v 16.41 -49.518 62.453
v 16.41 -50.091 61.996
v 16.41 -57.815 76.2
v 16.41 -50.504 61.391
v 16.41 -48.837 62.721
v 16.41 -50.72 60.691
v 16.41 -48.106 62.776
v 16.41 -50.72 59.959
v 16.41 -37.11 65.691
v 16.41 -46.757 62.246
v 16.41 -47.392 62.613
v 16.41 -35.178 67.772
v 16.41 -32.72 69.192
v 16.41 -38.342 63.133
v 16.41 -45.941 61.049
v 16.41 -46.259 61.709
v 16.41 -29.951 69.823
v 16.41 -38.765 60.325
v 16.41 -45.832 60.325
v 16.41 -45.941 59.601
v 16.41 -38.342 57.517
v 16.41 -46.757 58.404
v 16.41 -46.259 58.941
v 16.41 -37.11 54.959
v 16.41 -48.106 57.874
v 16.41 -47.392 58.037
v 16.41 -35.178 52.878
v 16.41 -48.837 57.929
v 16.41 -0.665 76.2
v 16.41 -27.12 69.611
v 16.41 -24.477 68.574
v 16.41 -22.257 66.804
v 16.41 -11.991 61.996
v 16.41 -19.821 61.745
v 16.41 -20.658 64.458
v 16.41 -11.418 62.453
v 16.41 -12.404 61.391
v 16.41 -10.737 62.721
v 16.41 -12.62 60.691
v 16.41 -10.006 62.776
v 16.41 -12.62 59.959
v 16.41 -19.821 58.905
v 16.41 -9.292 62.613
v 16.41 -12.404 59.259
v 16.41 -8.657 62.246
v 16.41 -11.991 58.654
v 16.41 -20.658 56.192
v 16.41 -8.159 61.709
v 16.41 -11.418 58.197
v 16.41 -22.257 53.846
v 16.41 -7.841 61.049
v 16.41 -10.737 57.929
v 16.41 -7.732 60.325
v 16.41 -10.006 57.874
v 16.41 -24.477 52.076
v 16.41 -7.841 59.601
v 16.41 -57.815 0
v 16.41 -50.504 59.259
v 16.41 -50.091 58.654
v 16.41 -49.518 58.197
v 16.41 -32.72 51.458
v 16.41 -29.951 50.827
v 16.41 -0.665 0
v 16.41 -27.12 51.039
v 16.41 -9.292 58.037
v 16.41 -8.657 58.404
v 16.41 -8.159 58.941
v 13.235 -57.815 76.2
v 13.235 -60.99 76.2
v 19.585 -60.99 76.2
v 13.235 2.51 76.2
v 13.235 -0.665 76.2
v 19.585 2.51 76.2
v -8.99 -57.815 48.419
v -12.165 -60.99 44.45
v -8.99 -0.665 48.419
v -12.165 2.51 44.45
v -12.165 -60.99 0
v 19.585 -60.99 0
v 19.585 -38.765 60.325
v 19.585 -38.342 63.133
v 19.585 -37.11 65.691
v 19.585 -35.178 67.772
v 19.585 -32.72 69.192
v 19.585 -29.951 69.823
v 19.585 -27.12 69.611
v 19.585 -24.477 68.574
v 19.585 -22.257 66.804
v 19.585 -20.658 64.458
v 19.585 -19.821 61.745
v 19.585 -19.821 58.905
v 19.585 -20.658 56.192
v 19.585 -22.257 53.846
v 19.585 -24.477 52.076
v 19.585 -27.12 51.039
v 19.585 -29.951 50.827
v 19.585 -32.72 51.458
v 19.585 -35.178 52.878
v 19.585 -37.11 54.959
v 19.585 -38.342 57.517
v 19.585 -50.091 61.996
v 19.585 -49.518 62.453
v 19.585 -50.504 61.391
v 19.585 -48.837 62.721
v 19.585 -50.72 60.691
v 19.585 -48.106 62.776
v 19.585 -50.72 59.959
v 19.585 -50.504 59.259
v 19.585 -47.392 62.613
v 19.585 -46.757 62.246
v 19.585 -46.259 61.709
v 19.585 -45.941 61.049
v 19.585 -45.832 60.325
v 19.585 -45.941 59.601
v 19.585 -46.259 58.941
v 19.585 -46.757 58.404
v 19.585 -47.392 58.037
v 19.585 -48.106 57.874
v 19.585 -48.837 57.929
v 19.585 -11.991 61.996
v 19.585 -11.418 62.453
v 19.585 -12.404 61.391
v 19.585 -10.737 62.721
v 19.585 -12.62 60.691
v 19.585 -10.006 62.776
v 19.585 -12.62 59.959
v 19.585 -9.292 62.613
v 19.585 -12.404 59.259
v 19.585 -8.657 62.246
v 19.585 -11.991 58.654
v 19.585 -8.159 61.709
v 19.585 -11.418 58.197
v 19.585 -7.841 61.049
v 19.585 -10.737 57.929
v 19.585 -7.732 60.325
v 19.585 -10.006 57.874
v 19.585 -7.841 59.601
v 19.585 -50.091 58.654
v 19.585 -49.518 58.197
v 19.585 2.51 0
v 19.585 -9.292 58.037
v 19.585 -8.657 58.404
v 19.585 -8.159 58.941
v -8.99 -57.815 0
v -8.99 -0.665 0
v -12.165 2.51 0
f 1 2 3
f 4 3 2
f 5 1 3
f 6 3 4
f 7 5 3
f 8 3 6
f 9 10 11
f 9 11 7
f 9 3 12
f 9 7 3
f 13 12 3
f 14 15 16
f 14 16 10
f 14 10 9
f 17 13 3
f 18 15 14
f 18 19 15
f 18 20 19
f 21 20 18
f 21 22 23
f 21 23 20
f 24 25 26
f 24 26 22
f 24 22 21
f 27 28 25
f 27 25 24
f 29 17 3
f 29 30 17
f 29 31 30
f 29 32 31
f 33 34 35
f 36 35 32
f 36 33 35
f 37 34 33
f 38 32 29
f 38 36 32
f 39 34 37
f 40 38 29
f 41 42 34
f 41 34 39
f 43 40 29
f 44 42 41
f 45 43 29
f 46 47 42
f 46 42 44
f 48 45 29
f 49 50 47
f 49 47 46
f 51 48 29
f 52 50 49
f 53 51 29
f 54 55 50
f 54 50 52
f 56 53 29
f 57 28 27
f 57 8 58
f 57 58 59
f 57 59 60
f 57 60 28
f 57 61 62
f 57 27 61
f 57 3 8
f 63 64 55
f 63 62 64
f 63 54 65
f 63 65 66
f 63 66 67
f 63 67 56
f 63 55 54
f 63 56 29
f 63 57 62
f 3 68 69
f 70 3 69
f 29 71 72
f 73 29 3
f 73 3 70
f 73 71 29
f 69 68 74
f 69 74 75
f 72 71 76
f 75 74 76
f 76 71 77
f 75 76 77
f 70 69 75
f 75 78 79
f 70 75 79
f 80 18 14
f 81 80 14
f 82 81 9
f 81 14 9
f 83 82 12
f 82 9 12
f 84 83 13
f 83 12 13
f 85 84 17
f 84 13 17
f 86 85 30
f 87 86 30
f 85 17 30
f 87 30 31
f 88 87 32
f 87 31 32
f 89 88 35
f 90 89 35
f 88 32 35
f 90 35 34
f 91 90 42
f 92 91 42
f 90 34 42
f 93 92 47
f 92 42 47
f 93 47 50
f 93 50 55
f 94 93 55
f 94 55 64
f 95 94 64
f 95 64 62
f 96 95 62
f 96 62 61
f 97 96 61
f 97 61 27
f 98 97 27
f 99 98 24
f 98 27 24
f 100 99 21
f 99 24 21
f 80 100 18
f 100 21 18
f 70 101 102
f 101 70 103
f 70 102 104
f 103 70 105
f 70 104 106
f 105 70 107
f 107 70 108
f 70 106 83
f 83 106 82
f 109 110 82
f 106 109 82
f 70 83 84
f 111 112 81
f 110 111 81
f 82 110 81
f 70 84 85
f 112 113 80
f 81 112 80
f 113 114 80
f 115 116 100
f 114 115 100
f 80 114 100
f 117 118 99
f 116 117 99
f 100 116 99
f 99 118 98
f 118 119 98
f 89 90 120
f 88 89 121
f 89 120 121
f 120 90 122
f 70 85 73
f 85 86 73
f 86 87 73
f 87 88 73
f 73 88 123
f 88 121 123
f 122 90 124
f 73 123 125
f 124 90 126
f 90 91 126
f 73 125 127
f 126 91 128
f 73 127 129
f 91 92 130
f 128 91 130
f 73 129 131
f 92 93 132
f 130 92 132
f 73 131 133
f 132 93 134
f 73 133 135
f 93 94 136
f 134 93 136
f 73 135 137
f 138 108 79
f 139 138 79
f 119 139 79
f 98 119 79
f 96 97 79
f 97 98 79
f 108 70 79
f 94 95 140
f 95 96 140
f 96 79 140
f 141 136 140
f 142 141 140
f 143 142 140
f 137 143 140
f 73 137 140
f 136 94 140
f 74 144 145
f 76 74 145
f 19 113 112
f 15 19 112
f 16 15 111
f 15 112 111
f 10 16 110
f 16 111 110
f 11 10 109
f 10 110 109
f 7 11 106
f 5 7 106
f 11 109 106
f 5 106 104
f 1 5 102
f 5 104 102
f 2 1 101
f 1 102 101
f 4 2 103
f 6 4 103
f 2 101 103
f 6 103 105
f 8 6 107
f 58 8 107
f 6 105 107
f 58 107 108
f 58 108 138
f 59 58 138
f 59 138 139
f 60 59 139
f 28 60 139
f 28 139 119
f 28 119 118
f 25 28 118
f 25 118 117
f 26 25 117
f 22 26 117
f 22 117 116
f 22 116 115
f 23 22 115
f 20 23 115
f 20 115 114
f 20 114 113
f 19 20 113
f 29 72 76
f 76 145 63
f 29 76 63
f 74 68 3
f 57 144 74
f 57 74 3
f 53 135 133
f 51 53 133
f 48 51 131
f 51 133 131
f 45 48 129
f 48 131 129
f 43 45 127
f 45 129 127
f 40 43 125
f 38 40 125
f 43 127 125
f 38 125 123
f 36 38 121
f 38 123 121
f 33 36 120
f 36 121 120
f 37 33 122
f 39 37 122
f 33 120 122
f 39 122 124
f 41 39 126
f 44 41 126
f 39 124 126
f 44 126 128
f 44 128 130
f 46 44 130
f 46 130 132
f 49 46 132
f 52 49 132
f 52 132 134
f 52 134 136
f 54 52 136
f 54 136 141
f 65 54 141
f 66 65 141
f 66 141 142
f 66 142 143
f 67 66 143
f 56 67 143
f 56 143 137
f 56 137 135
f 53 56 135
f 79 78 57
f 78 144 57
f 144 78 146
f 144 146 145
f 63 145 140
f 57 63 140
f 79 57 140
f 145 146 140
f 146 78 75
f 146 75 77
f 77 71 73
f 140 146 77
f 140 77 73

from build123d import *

# Parameters (mm, degrees)
SKETCH1_W                    = 31.75
SKETCH1_H                    = 63.5
SKETCH1_W_2                  = 25.4
SKETCH1_H_2                  = 57.15
BOSS_EXTRUDE1_DEPTH          = 76.2
CUT_EXTRUDE1_REACH           = 103.105
SKETCH3_R                    = 9.525
CUT_EXTRUDE2_DEPTH           = 3.175
F_10_0_1935_DIAMETER_HOLE1_D = 4.9149


with BuildPart() as part:
    # Sketch1 → Boss-Extrude1 (new body)
    with BuildSketch(Plane.XY):
        with Locations((3.710272719, -29.23968021)):
            Rectangle(SKETCH1_W, SKETCH1_H)
        with Locations((3.710272719, -29.23968021)):
            Rectangle(SKETCH1_W_2, SKETCH1_H_2, mode=Mode.SUBTRACT)
    extrude(amount=BOSS_EXTRUDE1_DEPTH)

    # Cut-Extrude1: up to this face of the body (flat: up to its plane)
    cut_extrude1_end = Plane(part.part.faces().sort_by_distance((3.710272719, -60.98968021, 38.1))[0])
    # Sketch2 → Cut-Extrude1 (cut, up to the picked face)
    with BuildSketch(Plane(origin=(0, 2.51031979, 0), x_dir=(1, 0, 0), z_dir=(0, 1, 0)), mode=Mode.PRIVATE) as cut_extrude1_sk1:
        Polygon((-12.164727281, -76.2), (13.235272719, -76.2), (-12.164727281, -44.45), align=None)
    cut_extrude1_tool1 = split(extrude(cut_extrude1_sk1.sketch, amount=-CUT_EXTRUDE1_REACH, mode=Mode.PRIVATE), bisect_by=cut_extrude1_end, keep=Keep.BOTH, mode=Mode.PRIVATE)
    add(cut_extrude1_tool1.solids().sort_by(Axis((-3.698061, 2.51032, 65.616667), (0, -1, 0)))[0], mode=Mode.SUBTRACT)

    # Sketch3 → Cut-Extrude2 (cut)
    with BuildSketch(Plane.ZY.offset(-16.410272719)):
        with Locations(Location((60.325, -29.23968021, 0), (0, 0, 270))):
            Circle(SKETCH3_R)
    extrude(amount=-CUT_EXTRUDE2_DEPTH, mode=Mode.SUBTRACT)

    # #10 (0.1935) Diameter Hole1 (through all)
    with Locations(Plane(origin=(16.410272719, -48.28968021, 60.325), x_dir=(0, -1, 0), z_dir=(-1, 0, 0))):
        with Locations((0, 0), (-38.1, 0)):
            Hole(F_10_0_1935_DIAMETER_HOLE1_D / 2)


solid = part.part
